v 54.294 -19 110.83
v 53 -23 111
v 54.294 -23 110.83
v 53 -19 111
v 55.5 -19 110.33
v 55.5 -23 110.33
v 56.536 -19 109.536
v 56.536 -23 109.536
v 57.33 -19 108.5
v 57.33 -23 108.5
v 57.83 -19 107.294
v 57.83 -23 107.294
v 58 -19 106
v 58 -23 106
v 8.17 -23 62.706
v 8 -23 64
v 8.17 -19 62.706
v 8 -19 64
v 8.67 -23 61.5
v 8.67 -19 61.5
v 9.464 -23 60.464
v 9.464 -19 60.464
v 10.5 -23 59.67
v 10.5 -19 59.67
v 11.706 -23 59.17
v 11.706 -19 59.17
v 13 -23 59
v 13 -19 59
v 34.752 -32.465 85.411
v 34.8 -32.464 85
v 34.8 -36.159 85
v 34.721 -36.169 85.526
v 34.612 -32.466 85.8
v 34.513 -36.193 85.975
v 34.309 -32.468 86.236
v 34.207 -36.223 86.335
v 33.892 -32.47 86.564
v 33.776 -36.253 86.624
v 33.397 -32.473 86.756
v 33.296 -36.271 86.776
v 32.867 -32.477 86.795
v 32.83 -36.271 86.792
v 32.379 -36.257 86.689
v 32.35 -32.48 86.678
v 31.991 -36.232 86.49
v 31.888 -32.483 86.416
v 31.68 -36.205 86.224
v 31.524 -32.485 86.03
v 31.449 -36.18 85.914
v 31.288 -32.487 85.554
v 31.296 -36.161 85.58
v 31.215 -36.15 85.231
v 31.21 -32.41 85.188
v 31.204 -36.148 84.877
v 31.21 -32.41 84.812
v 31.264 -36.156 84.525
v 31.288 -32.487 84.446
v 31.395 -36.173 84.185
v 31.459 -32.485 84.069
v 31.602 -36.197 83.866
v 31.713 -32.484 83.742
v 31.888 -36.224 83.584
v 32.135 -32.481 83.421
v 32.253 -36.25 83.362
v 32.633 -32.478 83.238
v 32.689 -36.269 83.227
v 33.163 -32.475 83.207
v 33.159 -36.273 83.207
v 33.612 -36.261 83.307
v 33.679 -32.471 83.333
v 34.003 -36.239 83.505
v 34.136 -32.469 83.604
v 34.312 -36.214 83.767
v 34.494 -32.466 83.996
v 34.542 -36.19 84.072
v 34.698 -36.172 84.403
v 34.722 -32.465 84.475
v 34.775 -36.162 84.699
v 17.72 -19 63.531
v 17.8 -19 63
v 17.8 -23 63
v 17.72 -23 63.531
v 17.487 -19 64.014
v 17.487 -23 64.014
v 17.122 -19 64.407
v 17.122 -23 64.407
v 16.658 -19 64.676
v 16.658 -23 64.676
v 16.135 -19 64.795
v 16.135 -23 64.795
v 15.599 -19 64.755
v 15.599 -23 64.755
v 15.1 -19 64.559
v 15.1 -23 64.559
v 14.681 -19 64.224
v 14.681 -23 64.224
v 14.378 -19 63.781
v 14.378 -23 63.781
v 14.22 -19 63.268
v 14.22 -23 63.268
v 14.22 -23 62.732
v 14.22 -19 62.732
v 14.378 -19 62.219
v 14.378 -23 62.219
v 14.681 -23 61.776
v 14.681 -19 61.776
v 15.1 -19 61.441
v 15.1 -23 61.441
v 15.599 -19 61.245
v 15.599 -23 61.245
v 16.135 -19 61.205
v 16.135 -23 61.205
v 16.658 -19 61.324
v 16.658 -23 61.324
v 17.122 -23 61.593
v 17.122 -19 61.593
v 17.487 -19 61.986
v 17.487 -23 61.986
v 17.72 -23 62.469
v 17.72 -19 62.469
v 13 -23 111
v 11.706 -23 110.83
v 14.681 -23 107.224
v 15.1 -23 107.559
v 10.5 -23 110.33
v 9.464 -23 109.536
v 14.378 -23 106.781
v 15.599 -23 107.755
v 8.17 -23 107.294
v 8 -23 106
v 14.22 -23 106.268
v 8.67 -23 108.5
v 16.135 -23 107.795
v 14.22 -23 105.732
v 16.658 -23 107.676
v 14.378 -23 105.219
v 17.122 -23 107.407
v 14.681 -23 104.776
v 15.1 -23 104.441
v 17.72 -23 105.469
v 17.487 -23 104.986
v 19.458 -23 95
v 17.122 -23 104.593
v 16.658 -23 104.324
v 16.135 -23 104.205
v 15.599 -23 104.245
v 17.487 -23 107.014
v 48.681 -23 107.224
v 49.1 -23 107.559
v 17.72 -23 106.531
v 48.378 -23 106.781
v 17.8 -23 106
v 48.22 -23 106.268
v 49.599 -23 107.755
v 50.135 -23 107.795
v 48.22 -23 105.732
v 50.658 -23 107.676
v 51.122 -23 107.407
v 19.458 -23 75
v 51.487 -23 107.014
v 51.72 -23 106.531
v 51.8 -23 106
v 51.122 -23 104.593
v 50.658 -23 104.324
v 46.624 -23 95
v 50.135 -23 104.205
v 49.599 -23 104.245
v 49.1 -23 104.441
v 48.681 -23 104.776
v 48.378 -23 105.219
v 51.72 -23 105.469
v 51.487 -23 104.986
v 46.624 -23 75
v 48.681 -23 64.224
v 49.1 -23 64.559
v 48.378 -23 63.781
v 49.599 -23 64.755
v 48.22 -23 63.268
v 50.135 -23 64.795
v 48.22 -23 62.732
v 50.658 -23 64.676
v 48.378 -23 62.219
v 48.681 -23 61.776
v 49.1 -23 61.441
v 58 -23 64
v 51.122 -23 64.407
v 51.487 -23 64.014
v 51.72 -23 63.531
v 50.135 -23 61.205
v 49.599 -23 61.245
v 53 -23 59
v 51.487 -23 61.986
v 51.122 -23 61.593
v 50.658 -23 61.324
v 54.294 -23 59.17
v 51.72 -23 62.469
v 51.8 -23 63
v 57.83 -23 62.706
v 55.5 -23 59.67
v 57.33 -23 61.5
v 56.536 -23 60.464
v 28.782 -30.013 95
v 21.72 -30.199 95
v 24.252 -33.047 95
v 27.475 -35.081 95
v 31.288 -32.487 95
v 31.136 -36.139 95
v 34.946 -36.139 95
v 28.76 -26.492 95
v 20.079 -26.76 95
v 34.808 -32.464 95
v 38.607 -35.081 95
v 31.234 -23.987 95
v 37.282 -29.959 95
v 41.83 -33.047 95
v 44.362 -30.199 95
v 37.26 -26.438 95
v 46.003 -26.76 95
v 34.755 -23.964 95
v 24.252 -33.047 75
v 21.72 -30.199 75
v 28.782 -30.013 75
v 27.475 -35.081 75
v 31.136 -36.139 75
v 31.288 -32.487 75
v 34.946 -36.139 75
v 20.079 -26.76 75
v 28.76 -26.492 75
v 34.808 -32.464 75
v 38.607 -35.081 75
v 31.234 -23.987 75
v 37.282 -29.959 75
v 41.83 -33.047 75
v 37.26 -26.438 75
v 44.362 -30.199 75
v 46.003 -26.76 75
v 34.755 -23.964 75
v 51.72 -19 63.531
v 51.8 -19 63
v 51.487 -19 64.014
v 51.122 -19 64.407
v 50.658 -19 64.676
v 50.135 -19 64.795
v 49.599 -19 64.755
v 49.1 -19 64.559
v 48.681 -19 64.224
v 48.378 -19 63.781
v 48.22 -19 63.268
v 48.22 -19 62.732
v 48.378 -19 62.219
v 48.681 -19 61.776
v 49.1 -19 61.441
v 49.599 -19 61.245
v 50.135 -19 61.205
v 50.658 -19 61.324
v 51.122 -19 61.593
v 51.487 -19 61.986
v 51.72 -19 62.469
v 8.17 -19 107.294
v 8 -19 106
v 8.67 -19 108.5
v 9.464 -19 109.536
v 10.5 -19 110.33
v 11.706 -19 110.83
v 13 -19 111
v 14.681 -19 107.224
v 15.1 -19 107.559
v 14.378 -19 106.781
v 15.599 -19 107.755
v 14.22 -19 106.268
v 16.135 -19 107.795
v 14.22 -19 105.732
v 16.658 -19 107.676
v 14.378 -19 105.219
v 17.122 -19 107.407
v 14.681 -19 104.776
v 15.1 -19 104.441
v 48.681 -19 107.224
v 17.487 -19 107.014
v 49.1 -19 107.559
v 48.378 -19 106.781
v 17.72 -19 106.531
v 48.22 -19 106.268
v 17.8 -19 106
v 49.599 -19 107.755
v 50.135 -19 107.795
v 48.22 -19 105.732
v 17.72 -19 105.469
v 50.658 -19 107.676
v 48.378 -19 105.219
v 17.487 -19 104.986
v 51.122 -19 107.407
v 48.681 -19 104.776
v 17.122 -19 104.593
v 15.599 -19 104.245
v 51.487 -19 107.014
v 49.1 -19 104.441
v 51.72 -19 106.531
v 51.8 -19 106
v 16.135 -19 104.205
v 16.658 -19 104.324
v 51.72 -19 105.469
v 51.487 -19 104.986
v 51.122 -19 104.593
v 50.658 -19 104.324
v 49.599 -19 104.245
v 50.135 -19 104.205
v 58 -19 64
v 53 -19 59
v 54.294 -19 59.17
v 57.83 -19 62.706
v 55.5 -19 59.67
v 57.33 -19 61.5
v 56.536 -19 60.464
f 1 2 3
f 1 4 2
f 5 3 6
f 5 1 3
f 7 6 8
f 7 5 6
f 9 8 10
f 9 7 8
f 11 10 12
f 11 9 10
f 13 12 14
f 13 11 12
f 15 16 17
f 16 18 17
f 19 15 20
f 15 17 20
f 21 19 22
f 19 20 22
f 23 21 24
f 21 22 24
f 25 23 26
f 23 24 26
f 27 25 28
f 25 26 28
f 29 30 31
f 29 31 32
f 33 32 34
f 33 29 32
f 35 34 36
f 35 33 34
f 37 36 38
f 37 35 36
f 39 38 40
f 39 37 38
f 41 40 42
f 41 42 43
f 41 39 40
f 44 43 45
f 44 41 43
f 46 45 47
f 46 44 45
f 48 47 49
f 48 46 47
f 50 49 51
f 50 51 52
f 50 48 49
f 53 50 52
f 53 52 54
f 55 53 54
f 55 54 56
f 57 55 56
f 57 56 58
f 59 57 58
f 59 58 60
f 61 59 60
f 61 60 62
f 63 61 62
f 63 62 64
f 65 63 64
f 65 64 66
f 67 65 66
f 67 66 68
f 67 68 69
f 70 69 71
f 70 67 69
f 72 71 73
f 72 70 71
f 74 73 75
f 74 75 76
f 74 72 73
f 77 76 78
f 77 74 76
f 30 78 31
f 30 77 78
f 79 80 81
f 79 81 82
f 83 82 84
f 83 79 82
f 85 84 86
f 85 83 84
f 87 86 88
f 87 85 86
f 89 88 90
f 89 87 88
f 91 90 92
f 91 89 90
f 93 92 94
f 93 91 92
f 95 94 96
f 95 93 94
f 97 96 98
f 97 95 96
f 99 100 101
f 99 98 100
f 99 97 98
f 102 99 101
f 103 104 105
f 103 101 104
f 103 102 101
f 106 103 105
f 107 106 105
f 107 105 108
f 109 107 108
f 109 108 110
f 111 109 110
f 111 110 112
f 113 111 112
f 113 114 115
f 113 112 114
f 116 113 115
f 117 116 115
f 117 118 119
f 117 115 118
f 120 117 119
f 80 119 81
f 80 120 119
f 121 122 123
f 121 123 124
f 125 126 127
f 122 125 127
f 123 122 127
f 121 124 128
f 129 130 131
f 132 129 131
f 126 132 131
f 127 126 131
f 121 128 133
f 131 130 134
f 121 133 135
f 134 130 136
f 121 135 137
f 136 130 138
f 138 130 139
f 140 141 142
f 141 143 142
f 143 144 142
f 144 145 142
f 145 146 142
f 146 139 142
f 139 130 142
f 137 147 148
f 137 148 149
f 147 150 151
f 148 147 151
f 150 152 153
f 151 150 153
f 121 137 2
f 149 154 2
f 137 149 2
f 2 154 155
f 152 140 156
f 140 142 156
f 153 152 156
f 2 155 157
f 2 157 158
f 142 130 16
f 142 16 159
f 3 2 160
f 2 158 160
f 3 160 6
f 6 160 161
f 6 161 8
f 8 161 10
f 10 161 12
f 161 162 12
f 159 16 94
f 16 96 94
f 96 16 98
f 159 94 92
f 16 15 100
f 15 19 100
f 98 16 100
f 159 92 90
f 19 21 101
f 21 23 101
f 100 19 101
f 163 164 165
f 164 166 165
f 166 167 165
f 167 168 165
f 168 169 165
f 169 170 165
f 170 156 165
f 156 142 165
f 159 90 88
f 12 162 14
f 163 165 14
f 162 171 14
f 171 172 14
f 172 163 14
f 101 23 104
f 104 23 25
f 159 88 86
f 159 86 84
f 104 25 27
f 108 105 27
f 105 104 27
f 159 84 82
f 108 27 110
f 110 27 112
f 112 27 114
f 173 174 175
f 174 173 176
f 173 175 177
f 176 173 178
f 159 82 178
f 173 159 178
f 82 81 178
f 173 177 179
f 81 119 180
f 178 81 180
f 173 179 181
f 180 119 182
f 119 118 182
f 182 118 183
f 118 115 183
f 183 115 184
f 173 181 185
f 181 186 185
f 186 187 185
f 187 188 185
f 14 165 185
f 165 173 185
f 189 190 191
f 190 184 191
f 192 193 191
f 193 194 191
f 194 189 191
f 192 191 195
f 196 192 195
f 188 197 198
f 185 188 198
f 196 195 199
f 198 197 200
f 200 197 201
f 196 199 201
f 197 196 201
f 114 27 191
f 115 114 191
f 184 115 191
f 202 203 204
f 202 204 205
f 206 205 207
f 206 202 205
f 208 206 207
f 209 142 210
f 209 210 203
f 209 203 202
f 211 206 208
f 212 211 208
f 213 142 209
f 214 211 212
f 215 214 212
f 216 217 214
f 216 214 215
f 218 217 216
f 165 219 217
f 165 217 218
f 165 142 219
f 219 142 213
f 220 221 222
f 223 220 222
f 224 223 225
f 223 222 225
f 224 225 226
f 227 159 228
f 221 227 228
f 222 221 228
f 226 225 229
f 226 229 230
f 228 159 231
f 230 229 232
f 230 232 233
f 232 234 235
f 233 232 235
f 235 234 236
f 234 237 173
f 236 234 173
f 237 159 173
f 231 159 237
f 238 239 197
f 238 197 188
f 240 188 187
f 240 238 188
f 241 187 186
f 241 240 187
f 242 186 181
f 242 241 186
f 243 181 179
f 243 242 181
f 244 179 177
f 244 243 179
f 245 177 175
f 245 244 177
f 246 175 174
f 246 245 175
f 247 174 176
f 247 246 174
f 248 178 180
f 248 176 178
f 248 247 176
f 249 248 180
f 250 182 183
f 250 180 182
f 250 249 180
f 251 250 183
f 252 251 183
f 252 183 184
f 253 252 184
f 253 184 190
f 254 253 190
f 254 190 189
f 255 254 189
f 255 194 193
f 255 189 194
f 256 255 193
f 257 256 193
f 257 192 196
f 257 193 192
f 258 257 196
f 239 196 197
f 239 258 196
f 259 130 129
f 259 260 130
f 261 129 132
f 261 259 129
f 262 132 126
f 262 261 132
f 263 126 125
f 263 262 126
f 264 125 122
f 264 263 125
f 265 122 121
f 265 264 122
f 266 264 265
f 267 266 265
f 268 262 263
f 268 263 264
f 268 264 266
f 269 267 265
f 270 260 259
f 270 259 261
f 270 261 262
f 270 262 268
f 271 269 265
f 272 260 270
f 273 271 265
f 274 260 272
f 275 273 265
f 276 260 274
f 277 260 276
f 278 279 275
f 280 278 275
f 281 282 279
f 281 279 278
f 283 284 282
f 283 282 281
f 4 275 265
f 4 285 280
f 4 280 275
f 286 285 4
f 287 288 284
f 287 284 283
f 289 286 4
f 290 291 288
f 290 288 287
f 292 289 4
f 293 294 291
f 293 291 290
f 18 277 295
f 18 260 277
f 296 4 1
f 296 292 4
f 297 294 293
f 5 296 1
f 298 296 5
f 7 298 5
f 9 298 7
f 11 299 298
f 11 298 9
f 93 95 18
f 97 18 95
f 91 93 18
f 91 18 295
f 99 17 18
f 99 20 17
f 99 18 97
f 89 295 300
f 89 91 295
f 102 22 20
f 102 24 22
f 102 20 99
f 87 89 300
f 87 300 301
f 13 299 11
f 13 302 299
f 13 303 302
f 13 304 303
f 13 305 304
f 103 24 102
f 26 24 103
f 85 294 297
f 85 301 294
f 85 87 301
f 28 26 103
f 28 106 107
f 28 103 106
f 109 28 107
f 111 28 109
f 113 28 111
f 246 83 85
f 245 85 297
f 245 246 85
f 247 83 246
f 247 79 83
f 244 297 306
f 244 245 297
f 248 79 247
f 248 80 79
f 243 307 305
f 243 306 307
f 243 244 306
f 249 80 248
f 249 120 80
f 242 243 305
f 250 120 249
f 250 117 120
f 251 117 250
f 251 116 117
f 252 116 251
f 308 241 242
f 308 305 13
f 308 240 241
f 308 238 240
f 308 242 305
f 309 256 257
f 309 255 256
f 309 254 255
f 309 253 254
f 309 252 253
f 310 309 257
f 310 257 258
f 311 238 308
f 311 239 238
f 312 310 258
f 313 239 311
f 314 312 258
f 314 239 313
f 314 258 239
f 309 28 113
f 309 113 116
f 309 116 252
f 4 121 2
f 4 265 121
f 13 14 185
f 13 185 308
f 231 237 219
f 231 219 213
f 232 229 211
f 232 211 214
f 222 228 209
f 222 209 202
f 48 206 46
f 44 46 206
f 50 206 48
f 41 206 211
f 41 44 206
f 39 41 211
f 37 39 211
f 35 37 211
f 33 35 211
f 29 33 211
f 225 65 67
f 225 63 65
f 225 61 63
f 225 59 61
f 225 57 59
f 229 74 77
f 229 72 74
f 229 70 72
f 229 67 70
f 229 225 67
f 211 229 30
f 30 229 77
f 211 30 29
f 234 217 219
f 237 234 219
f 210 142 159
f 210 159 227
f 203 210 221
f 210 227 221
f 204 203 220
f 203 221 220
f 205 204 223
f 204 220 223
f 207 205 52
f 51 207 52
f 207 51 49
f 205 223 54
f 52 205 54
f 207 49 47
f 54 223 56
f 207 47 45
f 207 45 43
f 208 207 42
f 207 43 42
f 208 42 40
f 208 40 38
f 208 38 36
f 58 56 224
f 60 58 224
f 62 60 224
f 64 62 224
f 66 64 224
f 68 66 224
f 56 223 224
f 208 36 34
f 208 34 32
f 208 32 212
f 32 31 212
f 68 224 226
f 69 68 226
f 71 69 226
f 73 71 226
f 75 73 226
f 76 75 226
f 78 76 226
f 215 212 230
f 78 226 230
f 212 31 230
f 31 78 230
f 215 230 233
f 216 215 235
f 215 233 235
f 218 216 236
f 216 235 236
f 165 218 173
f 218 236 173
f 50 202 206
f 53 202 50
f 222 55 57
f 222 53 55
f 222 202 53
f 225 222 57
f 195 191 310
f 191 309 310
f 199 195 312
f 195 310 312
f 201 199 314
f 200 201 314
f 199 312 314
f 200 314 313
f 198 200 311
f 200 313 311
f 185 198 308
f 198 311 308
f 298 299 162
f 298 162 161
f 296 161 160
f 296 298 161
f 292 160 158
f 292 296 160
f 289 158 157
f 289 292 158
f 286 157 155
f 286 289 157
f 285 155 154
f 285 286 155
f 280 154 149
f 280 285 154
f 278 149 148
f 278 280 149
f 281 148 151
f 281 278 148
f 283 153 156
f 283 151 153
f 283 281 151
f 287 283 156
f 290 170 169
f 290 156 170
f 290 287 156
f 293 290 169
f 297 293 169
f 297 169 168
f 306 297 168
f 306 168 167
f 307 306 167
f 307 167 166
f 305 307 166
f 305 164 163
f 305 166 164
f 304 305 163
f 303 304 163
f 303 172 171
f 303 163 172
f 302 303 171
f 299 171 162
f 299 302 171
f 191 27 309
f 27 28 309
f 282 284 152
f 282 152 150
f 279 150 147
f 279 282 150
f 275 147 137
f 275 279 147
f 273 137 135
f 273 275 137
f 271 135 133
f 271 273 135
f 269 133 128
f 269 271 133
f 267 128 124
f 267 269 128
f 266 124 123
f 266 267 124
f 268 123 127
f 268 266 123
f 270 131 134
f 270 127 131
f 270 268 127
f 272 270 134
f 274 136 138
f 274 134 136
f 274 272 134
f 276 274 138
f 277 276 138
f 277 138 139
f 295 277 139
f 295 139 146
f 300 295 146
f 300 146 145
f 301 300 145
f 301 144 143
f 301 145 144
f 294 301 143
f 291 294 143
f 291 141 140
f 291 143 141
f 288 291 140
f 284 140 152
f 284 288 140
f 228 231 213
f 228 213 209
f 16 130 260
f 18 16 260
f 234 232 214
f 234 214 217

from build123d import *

# Parameters (mm, degrees)
CYLINDER121_R          = 1.8
CYLINDER121_DEPTH      = 34
CYLINDER121_ROLL_ANGLE = 90
PAD057_DEPTH           = 20
CYLINDER118_R          = 1.8
CYLINDER118_DEPTH      = 34
CYLINDER118_ROLL_ANGLE = 90
CYLINDER117_R          = 1.8
CYLINDER117_DEPTH      = 34
CYLINDER117_ROLL_ANGLE = 90
CYLINDER120_R          = 1.8
CYLINDER120_DEPTH      = 34
CYLINDER120_ROLL_ANGLE = 90
CYLINDER119_R          = 1.8
CYLINDER119_DEPTH      = 34
CYLINDER119_ROLL_ANGLE = 90
BOX059_W               = 50
BOX059_H               = 4
BOX059_DEPTH           = 52
FILLET054_R            = 5


with BuildPart() as cilindro075:
    # Cylinder121 → Cylinder121 (new body)
    with BuildSketch(Plane.XY):
        Circle(CYLINDER121_R)
    extrude(amount=CYLINDER121_DEPTH)


with BuildPart() as cilindro075_1:
    # Cylinder121 roll: moved
    add(cilindro075.part.rotate(Axis((0, 0, 0), (1, 0, 0)), CYLINDER121_ROLL_ANGLE))


with BuildPart() as cilindro075_2:
    # Cylinder121 placement: moved
    add(cilindro075_1.part.moved(Location((33, -26, 85))))


with BuildPart() as cut139:
    # Sketch064 → Pad057 (new body)
    with BuildSketch(Plane(origin=(2, 0, 75), x_dir=(1, 0, 0), z_dir=(0, 0, 1))):
        with BuildLine():
            ThreePointArc((17.453972, -22.45432), (31.040886, -36.073109), (44.6278, -22.45432))
            Line((17.453972, -22.45432), (44.6278, -22.45432))
        make_face()
        Polygon((26.782288, -29.812588), (29.287536, -32.286525), (32.808351, -32.264384), (35.282288, -29.759136), (35.260147, -26.238321), (32.754899, -23.764384), (29.234084, -23.786525), (26.760147, -26.291773), align=None, mode=Mode.SUBTRACT)
    extrude(amount=PAD057_DEPTH)

    # Cut139: cut Cilindro075
    add(cilindro075_2.part, mode=Mode.SUBTRACT)


with BuildPart() as cut139_1:
    # Cut139 placement: moved
    add(cut139.part.moved(Location((0, -0.2, 0))))


with BuildPart() as cilindro072:
    # Cylinder118 → Cylinder118 (new body)
    with BuildSketch(Plane.XY):
        Circle(CYLINDER118_R)
    extrude(amount=CYLINDER118_DEPTH)


with BuildPart() as cilindro072_1:
    # Cylinder118 roll: moved
    add(cilindro072.part.rotate(Axis((0, 0, 0), (1, 0, 0)), CYLINDER118_ROLL_ANGLE))


with BuildPart() as cilindro072_2:
    # Cylinder118 placement: moved
    add(cilindro072_1.part.moved(Location((16, -10, 63))))


with BuildPart() as fusion066:
    # Cylinder117 → Cylinder117 (new body)
    with BuildSketch(Plane.XY):
        Circle(CYLINDER117_R)
    extrude(amount=CYLINDER117_DEPTH)


with BuildPart() as fusion066_1:
    # Cylinder117 roll: moved
    add(fusion066.part.rotate(Axis((0, 0, 0), (1, 0, 0)), CYLINDER117_ROLL_ANGLE))


with BuildPart() as fusion066_2:
    # Cylinder117 placement: moved
    add(fusion066_1.part.moved(Location((50, -10, 63))))

    # Fusion066: union Cilindro072
    add(cilindro072_2.part)


with BuildPart() as cilindro074:
    # Cylinder120 → Cylinder120 (new body)
    with BuildSketch(Plane.XY):
        Circle(CYLINDER120_R)
    extrude(amount=CYLINDER120_DEPTH)


with BuildPart() as cilindro074_1:
    # Cylinder120 roll: moved
    add(cilindro074.part.rotate(Axis((0, 0, 0), (1, 0, 0)), CYLINDER120_ROLL_ANGLE))


with BuildPart() as cilindro074_2:
    # Cylinder120 placement: moved
    add(cilindro074_1.part.moved(Location((16, -10, 63))))


with BuildPart() as fusion068:
    # Cylinder119 → Cylinder119 (new body)
    with BuildSketch(Plane.XY):
        Circle(CYLINDER119_R)
    extrude(amount=CYLINDER119_DEPTH)


with BuildPart() as fusion068_1:
    # Cylinder119 roll: moved
    add(fusion068.part.rotate(Axis((0, 0, 0), (1, 0, 0)), CYLINDER119_ROLL_ANGLE))


with BuildPart() as fusion068_2:
    # Cylinder119 placement: moved
    add(fusion068_1.part.moved(Location((50, -10, 63))))

    # Fusion067: union Cilindro074
    add(cilindro074_2.part)


with BuildPart() as fusion068_3:
    # Fusion067 placement: moved
    add(fusion068_2.part.moved(Location((0, 0, 43))))

    # Fusion068: union Fusion066
    add(fusion066_2.part)


with BuildPart() as lapis_holder:
    # Box059 → Box059 (new body)
    with BuildSketch(Plane(origin=(8, -23, 59), x_dir=(1, 0, 0), z_dir=(0, 0, 1))):
        with Locations((25, 2)):
            Rectangle(BOX059_W, BOX059_H)
    extrude(amount=BOX059_DEPTH)

    # Cut138: cut Fusion068
    add(fusion068_3.part, mode=Mode.SUBTRACT)

    # Fusion069: union Cut139
    add(cut139_1.part)

    # Fillet054
    fillet054_edges = [lapis_holder.edges().sort_by_distance(p)[0] for p in [
        (8, -21, 111),
        (8, -21, 59),
        (58, -21, 111),
        (58, -21, 59),
    ]]
    fillet(fillet054_edges, radius=FILLET054_R)


solid = lapis_holder.part
